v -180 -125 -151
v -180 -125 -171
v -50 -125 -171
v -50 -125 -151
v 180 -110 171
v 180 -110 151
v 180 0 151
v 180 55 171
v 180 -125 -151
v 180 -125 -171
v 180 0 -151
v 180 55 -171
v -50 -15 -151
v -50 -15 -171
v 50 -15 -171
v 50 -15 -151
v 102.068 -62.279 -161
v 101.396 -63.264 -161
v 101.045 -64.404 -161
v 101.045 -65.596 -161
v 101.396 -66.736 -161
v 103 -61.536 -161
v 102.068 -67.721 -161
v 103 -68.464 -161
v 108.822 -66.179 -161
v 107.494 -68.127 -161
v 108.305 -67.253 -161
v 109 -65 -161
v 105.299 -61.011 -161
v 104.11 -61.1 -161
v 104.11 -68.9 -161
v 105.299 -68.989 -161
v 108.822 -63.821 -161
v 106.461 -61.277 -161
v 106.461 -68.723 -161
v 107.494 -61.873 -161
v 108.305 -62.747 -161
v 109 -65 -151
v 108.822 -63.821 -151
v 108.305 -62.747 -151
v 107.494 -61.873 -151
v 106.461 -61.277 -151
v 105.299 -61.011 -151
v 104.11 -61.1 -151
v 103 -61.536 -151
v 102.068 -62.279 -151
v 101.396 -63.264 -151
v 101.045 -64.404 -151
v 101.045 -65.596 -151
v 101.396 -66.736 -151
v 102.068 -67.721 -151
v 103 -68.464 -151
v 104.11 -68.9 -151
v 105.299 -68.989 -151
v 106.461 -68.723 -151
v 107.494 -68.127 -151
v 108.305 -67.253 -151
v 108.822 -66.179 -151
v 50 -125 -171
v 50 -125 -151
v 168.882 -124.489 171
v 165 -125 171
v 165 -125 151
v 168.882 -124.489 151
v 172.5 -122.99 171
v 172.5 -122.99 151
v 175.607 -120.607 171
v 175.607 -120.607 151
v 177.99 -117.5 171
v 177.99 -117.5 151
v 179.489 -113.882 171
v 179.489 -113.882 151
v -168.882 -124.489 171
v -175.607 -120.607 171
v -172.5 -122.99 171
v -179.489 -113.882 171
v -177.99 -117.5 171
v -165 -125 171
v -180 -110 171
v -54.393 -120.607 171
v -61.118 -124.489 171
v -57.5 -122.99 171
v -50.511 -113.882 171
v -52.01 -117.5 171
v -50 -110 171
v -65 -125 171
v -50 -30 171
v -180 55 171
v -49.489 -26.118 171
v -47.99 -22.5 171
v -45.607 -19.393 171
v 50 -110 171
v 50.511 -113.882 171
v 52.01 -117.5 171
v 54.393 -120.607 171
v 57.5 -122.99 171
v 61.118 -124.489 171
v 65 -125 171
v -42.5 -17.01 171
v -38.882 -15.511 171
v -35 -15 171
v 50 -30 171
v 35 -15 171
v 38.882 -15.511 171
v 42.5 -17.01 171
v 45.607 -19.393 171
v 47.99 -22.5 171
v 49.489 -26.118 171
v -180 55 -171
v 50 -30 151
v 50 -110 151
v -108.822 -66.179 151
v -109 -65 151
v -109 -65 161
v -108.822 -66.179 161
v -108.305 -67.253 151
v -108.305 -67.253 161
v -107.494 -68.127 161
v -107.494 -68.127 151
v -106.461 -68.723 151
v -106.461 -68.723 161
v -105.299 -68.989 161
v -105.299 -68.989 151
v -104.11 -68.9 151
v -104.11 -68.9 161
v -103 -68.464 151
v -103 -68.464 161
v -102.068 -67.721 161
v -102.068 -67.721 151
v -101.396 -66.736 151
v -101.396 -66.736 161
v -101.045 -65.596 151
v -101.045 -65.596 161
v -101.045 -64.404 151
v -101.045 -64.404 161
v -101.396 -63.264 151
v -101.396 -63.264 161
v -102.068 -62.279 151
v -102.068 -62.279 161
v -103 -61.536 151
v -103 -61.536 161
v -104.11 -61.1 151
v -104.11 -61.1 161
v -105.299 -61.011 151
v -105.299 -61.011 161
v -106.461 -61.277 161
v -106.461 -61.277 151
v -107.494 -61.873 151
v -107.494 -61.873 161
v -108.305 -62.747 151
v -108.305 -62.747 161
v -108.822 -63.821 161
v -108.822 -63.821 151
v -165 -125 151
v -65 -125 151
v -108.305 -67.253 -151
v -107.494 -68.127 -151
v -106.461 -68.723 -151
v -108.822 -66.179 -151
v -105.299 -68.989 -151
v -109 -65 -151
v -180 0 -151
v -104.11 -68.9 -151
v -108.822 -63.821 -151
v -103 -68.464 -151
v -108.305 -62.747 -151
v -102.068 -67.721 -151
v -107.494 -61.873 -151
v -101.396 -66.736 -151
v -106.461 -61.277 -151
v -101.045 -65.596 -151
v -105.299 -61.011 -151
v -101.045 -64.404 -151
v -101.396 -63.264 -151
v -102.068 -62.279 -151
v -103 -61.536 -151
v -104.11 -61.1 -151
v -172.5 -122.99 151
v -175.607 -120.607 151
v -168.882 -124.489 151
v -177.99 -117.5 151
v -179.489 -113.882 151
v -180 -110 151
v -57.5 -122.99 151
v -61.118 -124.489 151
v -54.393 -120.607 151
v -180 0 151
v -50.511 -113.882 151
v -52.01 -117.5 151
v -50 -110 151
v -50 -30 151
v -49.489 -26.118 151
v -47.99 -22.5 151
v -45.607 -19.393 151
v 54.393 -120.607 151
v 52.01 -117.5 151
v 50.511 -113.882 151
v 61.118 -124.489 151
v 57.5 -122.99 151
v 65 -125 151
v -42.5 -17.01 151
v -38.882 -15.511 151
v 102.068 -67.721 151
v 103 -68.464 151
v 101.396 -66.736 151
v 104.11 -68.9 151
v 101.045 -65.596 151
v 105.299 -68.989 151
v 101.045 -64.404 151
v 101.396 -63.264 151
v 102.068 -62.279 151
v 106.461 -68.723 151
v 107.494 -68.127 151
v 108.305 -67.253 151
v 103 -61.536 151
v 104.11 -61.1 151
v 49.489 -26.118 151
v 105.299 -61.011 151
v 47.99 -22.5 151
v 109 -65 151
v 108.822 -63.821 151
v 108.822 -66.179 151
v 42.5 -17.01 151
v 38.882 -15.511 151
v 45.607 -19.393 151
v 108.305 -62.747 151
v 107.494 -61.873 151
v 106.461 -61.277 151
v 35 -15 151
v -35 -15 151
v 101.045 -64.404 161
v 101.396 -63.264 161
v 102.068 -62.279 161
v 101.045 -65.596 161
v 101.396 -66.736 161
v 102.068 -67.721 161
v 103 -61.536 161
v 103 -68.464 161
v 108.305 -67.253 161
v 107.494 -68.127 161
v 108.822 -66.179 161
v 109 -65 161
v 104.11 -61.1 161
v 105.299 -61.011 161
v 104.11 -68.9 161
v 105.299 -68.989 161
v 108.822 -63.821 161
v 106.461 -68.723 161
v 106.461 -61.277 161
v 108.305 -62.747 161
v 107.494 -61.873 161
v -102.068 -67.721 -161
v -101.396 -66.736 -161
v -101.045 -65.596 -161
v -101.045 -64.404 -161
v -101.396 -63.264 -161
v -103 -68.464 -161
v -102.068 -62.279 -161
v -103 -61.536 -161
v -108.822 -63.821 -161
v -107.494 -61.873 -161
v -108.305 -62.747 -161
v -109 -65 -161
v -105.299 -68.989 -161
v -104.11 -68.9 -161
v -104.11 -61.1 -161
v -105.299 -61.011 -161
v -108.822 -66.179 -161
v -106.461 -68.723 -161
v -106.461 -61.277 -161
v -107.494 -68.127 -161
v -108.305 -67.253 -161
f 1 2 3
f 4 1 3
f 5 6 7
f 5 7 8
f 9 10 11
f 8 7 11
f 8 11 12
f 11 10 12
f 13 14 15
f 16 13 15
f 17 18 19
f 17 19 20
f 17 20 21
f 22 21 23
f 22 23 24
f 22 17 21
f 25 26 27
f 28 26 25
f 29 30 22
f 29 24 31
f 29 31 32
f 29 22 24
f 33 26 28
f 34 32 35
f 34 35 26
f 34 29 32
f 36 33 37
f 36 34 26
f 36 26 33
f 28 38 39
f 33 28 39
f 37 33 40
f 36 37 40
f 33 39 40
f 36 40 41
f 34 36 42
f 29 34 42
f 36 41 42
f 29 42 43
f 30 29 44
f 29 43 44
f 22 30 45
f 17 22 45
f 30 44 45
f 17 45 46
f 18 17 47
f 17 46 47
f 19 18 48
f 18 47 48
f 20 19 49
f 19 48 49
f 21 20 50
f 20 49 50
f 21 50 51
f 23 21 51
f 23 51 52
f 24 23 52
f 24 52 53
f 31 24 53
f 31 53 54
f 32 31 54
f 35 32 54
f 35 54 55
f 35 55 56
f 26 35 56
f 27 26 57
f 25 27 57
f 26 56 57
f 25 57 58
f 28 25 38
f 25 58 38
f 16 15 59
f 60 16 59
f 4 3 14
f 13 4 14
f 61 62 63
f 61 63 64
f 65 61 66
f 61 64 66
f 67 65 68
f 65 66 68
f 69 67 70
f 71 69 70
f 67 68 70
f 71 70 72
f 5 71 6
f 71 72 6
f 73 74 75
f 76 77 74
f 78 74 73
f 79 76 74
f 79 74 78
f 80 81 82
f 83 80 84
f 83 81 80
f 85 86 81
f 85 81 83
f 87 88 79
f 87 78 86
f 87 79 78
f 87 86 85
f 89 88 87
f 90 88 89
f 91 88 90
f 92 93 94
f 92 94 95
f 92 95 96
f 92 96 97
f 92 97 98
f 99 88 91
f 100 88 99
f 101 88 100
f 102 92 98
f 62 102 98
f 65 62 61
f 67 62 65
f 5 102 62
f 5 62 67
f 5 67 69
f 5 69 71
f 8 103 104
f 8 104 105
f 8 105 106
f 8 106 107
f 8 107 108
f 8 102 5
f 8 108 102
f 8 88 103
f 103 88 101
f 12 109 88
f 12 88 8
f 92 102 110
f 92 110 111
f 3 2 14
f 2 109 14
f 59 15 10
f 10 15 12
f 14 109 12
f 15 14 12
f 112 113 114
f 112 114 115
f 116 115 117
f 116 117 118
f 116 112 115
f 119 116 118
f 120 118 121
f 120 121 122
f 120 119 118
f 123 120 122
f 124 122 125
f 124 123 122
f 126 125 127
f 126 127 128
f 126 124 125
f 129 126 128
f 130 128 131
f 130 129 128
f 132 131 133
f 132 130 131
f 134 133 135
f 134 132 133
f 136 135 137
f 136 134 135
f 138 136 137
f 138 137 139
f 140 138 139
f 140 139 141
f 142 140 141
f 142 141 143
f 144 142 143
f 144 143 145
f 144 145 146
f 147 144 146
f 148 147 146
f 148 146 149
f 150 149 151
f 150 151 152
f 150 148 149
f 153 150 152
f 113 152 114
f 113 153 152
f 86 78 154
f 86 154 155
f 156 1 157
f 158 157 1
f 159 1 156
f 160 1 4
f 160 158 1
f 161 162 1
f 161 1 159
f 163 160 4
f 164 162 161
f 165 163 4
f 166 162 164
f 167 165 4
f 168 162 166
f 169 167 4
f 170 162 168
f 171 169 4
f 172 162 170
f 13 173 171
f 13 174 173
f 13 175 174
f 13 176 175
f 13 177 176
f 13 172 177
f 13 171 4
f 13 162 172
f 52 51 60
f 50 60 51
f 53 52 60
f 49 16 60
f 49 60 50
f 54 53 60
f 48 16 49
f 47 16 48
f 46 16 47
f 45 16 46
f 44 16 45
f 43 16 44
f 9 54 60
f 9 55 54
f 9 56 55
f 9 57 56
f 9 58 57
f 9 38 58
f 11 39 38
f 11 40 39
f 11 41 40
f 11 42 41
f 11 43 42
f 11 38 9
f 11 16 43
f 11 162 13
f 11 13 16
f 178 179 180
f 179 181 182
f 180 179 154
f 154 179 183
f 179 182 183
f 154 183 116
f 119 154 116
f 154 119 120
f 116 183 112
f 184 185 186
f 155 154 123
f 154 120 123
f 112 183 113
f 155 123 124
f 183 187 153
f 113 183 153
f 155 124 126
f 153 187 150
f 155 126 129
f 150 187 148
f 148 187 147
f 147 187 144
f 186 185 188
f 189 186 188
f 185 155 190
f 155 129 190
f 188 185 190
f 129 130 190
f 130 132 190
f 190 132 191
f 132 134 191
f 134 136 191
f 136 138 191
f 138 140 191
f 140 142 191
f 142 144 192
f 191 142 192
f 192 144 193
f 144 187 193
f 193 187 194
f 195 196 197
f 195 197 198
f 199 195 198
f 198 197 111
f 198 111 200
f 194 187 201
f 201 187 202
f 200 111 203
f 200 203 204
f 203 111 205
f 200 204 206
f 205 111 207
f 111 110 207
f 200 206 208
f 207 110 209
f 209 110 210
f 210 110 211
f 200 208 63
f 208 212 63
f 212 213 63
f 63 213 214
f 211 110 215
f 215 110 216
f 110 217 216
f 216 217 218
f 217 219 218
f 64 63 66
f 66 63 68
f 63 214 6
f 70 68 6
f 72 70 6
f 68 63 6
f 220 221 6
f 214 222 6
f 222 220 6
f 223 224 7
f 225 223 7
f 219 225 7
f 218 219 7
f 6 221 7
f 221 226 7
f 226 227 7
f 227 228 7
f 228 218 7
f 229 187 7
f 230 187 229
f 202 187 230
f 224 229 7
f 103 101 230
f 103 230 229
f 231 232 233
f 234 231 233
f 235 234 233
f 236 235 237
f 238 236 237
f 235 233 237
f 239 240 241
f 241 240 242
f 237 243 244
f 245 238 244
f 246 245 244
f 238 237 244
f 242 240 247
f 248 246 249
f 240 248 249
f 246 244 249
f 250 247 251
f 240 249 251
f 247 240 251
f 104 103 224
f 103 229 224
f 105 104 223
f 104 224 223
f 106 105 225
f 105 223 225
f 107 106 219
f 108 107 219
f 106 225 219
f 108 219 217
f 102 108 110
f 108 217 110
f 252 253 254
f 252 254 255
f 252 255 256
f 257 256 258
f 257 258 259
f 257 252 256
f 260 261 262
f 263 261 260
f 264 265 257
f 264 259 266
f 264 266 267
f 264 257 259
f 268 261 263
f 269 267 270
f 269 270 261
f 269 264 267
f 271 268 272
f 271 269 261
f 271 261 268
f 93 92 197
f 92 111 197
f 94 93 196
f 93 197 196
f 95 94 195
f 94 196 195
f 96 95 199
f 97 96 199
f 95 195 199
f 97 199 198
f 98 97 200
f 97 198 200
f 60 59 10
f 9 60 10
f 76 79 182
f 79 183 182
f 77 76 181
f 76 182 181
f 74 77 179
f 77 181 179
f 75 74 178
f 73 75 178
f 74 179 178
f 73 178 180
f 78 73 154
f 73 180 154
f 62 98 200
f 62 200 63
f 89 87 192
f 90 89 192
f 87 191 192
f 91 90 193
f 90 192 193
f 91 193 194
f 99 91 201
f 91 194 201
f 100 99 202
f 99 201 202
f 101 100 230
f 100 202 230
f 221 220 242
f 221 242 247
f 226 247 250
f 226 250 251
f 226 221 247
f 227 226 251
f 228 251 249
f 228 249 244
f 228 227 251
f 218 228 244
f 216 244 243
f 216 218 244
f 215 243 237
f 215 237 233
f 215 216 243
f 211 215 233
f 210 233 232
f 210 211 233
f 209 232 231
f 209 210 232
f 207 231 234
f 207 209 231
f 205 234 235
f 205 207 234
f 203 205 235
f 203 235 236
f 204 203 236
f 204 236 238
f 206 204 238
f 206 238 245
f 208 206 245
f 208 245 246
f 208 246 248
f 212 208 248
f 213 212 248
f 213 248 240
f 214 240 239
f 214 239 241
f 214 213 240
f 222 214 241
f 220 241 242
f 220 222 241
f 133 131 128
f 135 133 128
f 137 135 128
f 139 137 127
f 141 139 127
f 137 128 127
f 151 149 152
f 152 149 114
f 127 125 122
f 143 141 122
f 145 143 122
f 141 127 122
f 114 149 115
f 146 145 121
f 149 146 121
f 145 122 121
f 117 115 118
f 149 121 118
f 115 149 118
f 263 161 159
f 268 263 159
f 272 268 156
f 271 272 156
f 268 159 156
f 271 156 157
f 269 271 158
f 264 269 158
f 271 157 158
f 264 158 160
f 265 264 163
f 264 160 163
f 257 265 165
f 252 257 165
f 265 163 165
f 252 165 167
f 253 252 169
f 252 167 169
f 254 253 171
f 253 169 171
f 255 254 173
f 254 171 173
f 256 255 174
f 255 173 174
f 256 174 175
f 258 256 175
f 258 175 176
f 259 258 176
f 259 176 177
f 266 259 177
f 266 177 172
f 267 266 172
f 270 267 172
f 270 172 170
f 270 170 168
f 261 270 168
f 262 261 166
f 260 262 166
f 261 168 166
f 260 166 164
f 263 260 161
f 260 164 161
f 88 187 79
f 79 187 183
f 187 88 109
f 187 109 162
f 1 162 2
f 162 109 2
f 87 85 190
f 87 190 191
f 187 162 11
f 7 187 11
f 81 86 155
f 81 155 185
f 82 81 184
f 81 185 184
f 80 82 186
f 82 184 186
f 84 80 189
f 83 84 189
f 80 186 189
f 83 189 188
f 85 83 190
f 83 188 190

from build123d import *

# Parameters (mm, degrees)
SKETCH1_W           = 360
SKETCH1_H           = 342
BOSS_EXTRUDE1_DEPTH = 55
BOSS_EXTRUDE2_DEPTH = 20
SKETCH4_R           = 4
CUT_EXTRUDE2_DEPTH  = 10
FILLET1_R           = 15


with BuildPart() as part:
    # Sketch1 → Boss-Extrude1 (new body)
    with BuildSketch(Plane(origin=(0, 0, 0), x_dir=(1, 0, 0), z_dir=(0, 1, 0))):
        Rectangle(SKETCH1_W, SKETCH1_H)
    extrude(amount=BOSS_EXTRUDE1_DEPTH)

    # Sketch2 → Boss-Extrude2 (add)
    with BuildSketch(Plane.XY.offset(171)):
        Polygon((180, 0), (0, 0), (0, -15), (50, -15), (50, -125), (180, -125), align=None)
        Polygon((0, 0), (-180, 0), (-180, -125), (-50, -125), (-50, -15), (0, -15), align=None)
    boss_extrude2 = extrude(amount=-BOSS_EXTRUDE2_DEPTH)

    # Sketch4 → Cut-Extrude2 (cut)
    with BuildSketch(Plane.XY.offset(151)):
        with Locations((105, -65)):
            Circle(SKETCH4_R)
        with Locations(Location((-105, -65, 0), (0, 0, 180))):
            Circle(SKETCH4_R)
    cut_extrude2 = extrude(amount=CUT_EXTRUDE2_DEPTH, mode=Mode.SUBTRACT)

    # Fillet1
    fillet1_edges = [part.edges().sort_by_distance(p)[0] for p in [
        (180, -125, 161),
        (50, -125, 161),
        (50, -15, 161),
        (-50, -15, 161),
        (-50, -125, 161),
        (-180, -125, 161),
    ]]
    fillet(fillet1_edges, radius=FILLET1_R)

    # Mirror1: Boss-Extrude2, Cut-Extrude2 across plane
    add(boss_extrude2.mirror(Plane.XY))
    add(cut_extrude2.mirror(Plane.XY), mode=Mode.SUBTRACT)


solid = part.part
